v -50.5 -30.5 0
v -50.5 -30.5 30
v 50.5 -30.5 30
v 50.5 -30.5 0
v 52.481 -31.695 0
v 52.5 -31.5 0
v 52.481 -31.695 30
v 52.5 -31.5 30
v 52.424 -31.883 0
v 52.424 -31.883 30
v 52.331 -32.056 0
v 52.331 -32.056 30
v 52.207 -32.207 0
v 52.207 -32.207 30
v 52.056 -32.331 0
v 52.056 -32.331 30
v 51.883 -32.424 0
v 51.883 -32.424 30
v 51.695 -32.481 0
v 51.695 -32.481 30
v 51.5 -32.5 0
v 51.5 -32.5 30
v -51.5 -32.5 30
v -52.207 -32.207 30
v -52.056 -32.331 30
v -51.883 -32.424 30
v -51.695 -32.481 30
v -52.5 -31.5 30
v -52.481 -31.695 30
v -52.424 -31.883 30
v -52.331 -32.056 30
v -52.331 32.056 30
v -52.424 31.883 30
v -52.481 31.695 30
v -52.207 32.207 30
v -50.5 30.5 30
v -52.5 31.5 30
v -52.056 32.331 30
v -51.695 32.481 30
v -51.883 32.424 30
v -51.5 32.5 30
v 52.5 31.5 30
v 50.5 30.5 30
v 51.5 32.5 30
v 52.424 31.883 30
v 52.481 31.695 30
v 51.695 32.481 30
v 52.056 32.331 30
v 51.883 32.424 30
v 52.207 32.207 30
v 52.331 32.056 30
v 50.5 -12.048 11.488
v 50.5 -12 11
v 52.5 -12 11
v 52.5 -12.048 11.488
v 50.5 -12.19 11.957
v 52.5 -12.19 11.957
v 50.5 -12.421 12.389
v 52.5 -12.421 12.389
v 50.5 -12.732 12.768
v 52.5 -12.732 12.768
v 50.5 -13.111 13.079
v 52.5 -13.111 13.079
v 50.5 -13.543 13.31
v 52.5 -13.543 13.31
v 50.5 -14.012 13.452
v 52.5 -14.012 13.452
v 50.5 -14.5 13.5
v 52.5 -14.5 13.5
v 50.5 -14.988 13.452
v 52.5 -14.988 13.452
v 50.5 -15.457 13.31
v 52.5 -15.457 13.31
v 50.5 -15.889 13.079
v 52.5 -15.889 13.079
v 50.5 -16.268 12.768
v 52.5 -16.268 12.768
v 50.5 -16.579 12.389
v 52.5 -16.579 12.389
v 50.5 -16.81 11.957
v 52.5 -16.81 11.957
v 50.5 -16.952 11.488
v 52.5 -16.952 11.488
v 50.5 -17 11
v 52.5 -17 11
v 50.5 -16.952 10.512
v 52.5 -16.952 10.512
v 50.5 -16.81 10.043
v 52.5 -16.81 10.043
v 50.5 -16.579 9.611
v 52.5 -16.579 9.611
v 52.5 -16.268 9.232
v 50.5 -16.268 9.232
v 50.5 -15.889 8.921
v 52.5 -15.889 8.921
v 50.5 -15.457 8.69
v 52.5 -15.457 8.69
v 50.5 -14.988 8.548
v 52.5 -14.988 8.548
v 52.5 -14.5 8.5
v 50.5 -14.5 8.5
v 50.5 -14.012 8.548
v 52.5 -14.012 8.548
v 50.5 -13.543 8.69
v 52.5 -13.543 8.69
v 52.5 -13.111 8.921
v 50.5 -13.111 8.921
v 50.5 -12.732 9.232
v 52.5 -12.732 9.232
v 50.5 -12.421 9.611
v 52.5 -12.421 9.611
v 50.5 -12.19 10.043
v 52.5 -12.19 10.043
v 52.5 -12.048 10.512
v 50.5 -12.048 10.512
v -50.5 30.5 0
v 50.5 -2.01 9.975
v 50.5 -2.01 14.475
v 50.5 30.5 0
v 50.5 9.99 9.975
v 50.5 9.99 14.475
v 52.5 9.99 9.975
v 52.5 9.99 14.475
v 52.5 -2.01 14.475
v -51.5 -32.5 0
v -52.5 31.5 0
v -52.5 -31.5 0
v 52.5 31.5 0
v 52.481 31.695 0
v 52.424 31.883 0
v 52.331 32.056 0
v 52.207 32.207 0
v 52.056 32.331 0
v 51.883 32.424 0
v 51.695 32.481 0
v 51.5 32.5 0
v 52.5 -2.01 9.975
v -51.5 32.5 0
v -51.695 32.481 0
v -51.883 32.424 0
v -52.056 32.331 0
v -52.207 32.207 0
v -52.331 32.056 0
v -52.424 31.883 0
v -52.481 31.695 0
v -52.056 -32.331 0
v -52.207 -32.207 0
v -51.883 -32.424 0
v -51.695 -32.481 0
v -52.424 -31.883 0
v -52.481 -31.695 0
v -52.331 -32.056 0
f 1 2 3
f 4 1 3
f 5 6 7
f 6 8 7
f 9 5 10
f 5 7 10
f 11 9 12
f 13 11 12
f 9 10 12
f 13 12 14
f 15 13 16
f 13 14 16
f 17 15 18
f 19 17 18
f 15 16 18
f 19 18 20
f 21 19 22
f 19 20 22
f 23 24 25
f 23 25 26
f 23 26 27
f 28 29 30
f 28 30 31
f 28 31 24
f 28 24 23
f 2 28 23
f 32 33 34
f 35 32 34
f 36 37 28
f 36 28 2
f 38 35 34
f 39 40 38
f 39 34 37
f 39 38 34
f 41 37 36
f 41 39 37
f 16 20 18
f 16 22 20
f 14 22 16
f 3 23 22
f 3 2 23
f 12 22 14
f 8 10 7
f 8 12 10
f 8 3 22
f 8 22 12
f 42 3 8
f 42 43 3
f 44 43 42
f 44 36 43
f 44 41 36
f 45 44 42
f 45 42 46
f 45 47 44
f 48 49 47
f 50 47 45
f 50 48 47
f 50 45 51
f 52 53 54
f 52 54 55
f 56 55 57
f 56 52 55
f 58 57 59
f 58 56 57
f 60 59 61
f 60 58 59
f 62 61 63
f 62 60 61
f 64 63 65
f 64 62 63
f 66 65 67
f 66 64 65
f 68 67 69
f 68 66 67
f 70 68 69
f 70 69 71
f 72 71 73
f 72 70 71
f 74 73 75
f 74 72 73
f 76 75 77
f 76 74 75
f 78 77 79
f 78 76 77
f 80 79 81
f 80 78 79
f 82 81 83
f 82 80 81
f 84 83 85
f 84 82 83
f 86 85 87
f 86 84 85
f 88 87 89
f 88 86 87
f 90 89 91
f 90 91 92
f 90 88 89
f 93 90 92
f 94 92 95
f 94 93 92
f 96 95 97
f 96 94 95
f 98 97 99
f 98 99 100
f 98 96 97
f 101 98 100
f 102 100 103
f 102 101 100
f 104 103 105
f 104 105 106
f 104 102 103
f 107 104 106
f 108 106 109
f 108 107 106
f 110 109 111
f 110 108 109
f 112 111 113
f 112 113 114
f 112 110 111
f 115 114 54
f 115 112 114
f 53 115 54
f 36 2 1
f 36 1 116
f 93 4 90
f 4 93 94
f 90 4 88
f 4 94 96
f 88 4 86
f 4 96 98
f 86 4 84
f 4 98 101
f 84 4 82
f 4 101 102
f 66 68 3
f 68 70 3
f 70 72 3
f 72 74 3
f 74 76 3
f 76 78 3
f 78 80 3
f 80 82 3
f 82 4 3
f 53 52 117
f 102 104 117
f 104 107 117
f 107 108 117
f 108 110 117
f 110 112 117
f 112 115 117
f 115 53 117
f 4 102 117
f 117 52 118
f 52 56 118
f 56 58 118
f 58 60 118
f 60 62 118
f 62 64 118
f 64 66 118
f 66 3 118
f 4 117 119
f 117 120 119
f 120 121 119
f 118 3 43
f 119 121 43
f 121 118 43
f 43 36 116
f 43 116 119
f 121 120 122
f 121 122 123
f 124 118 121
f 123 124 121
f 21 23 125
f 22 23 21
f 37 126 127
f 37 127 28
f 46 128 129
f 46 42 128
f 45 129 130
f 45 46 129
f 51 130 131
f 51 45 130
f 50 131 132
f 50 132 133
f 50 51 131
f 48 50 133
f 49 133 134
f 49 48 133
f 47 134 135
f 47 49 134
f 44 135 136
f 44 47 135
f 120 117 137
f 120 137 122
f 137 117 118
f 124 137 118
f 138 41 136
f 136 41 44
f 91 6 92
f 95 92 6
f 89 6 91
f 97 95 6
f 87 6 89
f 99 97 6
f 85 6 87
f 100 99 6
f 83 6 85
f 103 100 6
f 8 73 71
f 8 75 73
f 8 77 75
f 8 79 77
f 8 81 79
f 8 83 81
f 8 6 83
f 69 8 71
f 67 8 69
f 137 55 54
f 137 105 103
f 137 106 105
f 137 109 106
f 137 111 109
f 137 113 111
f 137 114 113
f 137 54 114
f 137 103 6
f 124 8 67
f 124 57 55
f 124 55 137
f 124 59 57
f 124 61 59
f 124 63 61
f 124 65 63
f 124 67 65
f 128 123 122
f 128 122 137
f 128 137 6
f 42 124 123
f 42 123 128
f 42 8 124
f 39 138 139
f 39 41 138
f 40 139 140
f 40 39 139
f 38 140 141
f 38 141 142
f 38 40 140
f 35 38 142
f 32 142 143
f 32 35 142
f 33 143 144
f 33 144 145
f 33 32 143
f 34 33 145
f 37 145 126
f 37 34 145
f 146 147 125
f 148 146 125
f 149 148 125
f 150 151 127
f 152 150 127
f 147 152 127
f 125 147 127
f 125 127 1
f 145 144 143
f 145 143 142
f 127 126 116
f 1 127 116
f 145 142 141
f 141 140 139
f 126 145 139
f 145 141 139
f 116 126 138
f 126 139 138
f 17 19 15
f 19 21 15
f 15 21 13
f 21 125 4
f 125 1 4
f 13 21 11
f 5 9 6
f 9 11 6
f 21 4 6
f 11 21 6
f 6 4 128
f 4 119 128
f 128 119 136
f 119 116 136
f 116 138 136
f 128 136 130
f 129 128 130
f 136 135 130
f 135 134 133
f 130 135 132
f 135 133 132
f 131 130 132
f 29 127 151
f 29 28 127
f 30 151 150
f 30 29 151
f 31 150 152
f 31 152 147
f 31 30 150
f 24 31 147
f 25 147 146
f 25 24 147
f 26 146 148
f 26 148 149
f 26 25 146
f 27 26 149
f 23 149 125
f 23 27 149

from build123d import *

# Parameters (mm, degrees)
SKETCH004_W   = 65
SKETCH004_H   = 30
SKETCH004_R   = 2.5
SKETCH004_W_2 = 12
SKETCH004_H_2 = 4.5
PAD003_DEPTH  = 2
FILLET004_R   = 1
FILLET005_R   = 1
SKETCH002_W   = 105
SKETCH002_H   = 30
PAD001_DEPTH  = 2
FILLET002_R   = 1
FILLET003_R   = 1
SKETCH005_W   = 65
SKETCH005_H   = 30
PAD004_DEPTH  = 2
FILLET016_R   = 1
FILLET021_R   = 1
SKETCH003_W   = 105
SKETCH003_H   = 30
PAD002_DEPTH  = 2
FILLET009_R   = 1
FILLET017_R   = 1


with BuildPart() as body003:
    # Sketch004 → Pad003 (new body)
    with BuildSketch(Plane.YZ):
        with Locations((0, 15)):
            Rectangle(SKETCH004_W, SKETCH004_H)
        with Locations((-14.5, 11)):
            Circle(SKETCH004_R, mode=Mode.SUBTRACT)
        with Locations((3.989801, 12.224792)):
            Rectangle(SKETCH004_W_2, SKETCH004_H_2, mode=Mode.SUBTRACT)
    extrude(amount=PAD003_DEPTH)

    # Fillet004
    fillet004_edges = [body003.edges().sort_by_distance(p)[0] for p in [
        (2, 32.5, 15),
    ]]
    fillet(fillet004_edges, radius=FILLET004_R)

    # Fillet005
    fillet005_edges = [body003.edges().sort_by_distance(p)[0] for p in [
        (2, -32.5, 15),
    ]]
    fillet(fillet005_edges, radius=FILLET005_R)


with BuildPart() as body003_1:
    # Body003 placement: moved
    add(body003.part.moved(Location((50.5, 0, 0))))


with BuildPart() as body001:
    # Sketch002 → Pad001 (new body)
    with BuildSketch(Plane.XZ):
        with Locations((0, 15)):
            Rectangle(SKETCH002_W, SKETCH002_H)
    extrude(amount=PAD001_DEPTH)

    # Fillet002
    fillet002_edges = [body001.edges().sort_by_distance(p)[0] for p in [
        (-52.5, -2, 15),
    ]]
    fillet(fillet002_edges, radius=FILLET002_R)

    # Fillet003
    fillet003_edges = [body001.edges().sort_by_distance(p)[0] for p in [
        (52.5, -2, 15),
    ]]
    fillet(fillet003_edges, radius=FILLET003_R)


with BuildPart() as body001_1:
    # Body001 placement: moved
    add(body001.part.moved(Location((0, -30.5, 0))))


with BuildPart() as body004:
    # Sketch005 → Pad004 (new body)
    with BuildSketch(Plane.YZ):
        with Locations((0, 15)):
            Rectangle(SKETCH005_W, SKETCH005_H)
    extrude(amount=PAD004_DEPTH)

    # Fillet016
    fillet016_edges = [body004.edges().sort_by_distance(p)[0] for p in [
        (0, 32.5, 15),
    ]]
    fillet(fillet016_edges, radius=FILLET016_R)

    # Fillet021
    fillet021_edges = [body004.edges().sort_by_distance(p)[0] for p in [
        (0, -32.5, 15),
    ]]
    fillet(fillet021_edges, radius=FILLET021_R)


with BuildPart() as body004_1:
    # Body004 placement: moved
    add(body004.part.moved(Location((-52.5, 0, 0))))


with BuildPart() as body010:
    # Sketch003 → Pad002 (new body)
    with BuildSketch(Plane.XZ):
        with Locations((0, 15)):
            Rectangle(SKETCH003_W, SKETCH003_H)
    extrude(amount=PAD002_DEPTH)

    # Fillet009
    fillet009_edges = [body010.edges().sort_by_distance(p)[0] for p in [
        (52.5, 0, 15),
    ]]
    fillet(fillet009_edges, radius=FILLET009_R)

    # Fillet017
    fillet017_edges = [body010.edges().sort_by_distance(p)[0] for p in [
        (-52.5, 0, 15),
    ]]
    fillet(fillet017_edges, radius=FILLET017_R)


with BuildPart() as body010_1:
    # Body002 placement: moved
    add(body010.part.moved(Location((0, 32.5, 0))))

    # Fusion001: union Body003, Body001, Body004
    add(body003_1.part)
    add(body001_1.part)
    add(body004_1.part)


solid = body010_1.part
